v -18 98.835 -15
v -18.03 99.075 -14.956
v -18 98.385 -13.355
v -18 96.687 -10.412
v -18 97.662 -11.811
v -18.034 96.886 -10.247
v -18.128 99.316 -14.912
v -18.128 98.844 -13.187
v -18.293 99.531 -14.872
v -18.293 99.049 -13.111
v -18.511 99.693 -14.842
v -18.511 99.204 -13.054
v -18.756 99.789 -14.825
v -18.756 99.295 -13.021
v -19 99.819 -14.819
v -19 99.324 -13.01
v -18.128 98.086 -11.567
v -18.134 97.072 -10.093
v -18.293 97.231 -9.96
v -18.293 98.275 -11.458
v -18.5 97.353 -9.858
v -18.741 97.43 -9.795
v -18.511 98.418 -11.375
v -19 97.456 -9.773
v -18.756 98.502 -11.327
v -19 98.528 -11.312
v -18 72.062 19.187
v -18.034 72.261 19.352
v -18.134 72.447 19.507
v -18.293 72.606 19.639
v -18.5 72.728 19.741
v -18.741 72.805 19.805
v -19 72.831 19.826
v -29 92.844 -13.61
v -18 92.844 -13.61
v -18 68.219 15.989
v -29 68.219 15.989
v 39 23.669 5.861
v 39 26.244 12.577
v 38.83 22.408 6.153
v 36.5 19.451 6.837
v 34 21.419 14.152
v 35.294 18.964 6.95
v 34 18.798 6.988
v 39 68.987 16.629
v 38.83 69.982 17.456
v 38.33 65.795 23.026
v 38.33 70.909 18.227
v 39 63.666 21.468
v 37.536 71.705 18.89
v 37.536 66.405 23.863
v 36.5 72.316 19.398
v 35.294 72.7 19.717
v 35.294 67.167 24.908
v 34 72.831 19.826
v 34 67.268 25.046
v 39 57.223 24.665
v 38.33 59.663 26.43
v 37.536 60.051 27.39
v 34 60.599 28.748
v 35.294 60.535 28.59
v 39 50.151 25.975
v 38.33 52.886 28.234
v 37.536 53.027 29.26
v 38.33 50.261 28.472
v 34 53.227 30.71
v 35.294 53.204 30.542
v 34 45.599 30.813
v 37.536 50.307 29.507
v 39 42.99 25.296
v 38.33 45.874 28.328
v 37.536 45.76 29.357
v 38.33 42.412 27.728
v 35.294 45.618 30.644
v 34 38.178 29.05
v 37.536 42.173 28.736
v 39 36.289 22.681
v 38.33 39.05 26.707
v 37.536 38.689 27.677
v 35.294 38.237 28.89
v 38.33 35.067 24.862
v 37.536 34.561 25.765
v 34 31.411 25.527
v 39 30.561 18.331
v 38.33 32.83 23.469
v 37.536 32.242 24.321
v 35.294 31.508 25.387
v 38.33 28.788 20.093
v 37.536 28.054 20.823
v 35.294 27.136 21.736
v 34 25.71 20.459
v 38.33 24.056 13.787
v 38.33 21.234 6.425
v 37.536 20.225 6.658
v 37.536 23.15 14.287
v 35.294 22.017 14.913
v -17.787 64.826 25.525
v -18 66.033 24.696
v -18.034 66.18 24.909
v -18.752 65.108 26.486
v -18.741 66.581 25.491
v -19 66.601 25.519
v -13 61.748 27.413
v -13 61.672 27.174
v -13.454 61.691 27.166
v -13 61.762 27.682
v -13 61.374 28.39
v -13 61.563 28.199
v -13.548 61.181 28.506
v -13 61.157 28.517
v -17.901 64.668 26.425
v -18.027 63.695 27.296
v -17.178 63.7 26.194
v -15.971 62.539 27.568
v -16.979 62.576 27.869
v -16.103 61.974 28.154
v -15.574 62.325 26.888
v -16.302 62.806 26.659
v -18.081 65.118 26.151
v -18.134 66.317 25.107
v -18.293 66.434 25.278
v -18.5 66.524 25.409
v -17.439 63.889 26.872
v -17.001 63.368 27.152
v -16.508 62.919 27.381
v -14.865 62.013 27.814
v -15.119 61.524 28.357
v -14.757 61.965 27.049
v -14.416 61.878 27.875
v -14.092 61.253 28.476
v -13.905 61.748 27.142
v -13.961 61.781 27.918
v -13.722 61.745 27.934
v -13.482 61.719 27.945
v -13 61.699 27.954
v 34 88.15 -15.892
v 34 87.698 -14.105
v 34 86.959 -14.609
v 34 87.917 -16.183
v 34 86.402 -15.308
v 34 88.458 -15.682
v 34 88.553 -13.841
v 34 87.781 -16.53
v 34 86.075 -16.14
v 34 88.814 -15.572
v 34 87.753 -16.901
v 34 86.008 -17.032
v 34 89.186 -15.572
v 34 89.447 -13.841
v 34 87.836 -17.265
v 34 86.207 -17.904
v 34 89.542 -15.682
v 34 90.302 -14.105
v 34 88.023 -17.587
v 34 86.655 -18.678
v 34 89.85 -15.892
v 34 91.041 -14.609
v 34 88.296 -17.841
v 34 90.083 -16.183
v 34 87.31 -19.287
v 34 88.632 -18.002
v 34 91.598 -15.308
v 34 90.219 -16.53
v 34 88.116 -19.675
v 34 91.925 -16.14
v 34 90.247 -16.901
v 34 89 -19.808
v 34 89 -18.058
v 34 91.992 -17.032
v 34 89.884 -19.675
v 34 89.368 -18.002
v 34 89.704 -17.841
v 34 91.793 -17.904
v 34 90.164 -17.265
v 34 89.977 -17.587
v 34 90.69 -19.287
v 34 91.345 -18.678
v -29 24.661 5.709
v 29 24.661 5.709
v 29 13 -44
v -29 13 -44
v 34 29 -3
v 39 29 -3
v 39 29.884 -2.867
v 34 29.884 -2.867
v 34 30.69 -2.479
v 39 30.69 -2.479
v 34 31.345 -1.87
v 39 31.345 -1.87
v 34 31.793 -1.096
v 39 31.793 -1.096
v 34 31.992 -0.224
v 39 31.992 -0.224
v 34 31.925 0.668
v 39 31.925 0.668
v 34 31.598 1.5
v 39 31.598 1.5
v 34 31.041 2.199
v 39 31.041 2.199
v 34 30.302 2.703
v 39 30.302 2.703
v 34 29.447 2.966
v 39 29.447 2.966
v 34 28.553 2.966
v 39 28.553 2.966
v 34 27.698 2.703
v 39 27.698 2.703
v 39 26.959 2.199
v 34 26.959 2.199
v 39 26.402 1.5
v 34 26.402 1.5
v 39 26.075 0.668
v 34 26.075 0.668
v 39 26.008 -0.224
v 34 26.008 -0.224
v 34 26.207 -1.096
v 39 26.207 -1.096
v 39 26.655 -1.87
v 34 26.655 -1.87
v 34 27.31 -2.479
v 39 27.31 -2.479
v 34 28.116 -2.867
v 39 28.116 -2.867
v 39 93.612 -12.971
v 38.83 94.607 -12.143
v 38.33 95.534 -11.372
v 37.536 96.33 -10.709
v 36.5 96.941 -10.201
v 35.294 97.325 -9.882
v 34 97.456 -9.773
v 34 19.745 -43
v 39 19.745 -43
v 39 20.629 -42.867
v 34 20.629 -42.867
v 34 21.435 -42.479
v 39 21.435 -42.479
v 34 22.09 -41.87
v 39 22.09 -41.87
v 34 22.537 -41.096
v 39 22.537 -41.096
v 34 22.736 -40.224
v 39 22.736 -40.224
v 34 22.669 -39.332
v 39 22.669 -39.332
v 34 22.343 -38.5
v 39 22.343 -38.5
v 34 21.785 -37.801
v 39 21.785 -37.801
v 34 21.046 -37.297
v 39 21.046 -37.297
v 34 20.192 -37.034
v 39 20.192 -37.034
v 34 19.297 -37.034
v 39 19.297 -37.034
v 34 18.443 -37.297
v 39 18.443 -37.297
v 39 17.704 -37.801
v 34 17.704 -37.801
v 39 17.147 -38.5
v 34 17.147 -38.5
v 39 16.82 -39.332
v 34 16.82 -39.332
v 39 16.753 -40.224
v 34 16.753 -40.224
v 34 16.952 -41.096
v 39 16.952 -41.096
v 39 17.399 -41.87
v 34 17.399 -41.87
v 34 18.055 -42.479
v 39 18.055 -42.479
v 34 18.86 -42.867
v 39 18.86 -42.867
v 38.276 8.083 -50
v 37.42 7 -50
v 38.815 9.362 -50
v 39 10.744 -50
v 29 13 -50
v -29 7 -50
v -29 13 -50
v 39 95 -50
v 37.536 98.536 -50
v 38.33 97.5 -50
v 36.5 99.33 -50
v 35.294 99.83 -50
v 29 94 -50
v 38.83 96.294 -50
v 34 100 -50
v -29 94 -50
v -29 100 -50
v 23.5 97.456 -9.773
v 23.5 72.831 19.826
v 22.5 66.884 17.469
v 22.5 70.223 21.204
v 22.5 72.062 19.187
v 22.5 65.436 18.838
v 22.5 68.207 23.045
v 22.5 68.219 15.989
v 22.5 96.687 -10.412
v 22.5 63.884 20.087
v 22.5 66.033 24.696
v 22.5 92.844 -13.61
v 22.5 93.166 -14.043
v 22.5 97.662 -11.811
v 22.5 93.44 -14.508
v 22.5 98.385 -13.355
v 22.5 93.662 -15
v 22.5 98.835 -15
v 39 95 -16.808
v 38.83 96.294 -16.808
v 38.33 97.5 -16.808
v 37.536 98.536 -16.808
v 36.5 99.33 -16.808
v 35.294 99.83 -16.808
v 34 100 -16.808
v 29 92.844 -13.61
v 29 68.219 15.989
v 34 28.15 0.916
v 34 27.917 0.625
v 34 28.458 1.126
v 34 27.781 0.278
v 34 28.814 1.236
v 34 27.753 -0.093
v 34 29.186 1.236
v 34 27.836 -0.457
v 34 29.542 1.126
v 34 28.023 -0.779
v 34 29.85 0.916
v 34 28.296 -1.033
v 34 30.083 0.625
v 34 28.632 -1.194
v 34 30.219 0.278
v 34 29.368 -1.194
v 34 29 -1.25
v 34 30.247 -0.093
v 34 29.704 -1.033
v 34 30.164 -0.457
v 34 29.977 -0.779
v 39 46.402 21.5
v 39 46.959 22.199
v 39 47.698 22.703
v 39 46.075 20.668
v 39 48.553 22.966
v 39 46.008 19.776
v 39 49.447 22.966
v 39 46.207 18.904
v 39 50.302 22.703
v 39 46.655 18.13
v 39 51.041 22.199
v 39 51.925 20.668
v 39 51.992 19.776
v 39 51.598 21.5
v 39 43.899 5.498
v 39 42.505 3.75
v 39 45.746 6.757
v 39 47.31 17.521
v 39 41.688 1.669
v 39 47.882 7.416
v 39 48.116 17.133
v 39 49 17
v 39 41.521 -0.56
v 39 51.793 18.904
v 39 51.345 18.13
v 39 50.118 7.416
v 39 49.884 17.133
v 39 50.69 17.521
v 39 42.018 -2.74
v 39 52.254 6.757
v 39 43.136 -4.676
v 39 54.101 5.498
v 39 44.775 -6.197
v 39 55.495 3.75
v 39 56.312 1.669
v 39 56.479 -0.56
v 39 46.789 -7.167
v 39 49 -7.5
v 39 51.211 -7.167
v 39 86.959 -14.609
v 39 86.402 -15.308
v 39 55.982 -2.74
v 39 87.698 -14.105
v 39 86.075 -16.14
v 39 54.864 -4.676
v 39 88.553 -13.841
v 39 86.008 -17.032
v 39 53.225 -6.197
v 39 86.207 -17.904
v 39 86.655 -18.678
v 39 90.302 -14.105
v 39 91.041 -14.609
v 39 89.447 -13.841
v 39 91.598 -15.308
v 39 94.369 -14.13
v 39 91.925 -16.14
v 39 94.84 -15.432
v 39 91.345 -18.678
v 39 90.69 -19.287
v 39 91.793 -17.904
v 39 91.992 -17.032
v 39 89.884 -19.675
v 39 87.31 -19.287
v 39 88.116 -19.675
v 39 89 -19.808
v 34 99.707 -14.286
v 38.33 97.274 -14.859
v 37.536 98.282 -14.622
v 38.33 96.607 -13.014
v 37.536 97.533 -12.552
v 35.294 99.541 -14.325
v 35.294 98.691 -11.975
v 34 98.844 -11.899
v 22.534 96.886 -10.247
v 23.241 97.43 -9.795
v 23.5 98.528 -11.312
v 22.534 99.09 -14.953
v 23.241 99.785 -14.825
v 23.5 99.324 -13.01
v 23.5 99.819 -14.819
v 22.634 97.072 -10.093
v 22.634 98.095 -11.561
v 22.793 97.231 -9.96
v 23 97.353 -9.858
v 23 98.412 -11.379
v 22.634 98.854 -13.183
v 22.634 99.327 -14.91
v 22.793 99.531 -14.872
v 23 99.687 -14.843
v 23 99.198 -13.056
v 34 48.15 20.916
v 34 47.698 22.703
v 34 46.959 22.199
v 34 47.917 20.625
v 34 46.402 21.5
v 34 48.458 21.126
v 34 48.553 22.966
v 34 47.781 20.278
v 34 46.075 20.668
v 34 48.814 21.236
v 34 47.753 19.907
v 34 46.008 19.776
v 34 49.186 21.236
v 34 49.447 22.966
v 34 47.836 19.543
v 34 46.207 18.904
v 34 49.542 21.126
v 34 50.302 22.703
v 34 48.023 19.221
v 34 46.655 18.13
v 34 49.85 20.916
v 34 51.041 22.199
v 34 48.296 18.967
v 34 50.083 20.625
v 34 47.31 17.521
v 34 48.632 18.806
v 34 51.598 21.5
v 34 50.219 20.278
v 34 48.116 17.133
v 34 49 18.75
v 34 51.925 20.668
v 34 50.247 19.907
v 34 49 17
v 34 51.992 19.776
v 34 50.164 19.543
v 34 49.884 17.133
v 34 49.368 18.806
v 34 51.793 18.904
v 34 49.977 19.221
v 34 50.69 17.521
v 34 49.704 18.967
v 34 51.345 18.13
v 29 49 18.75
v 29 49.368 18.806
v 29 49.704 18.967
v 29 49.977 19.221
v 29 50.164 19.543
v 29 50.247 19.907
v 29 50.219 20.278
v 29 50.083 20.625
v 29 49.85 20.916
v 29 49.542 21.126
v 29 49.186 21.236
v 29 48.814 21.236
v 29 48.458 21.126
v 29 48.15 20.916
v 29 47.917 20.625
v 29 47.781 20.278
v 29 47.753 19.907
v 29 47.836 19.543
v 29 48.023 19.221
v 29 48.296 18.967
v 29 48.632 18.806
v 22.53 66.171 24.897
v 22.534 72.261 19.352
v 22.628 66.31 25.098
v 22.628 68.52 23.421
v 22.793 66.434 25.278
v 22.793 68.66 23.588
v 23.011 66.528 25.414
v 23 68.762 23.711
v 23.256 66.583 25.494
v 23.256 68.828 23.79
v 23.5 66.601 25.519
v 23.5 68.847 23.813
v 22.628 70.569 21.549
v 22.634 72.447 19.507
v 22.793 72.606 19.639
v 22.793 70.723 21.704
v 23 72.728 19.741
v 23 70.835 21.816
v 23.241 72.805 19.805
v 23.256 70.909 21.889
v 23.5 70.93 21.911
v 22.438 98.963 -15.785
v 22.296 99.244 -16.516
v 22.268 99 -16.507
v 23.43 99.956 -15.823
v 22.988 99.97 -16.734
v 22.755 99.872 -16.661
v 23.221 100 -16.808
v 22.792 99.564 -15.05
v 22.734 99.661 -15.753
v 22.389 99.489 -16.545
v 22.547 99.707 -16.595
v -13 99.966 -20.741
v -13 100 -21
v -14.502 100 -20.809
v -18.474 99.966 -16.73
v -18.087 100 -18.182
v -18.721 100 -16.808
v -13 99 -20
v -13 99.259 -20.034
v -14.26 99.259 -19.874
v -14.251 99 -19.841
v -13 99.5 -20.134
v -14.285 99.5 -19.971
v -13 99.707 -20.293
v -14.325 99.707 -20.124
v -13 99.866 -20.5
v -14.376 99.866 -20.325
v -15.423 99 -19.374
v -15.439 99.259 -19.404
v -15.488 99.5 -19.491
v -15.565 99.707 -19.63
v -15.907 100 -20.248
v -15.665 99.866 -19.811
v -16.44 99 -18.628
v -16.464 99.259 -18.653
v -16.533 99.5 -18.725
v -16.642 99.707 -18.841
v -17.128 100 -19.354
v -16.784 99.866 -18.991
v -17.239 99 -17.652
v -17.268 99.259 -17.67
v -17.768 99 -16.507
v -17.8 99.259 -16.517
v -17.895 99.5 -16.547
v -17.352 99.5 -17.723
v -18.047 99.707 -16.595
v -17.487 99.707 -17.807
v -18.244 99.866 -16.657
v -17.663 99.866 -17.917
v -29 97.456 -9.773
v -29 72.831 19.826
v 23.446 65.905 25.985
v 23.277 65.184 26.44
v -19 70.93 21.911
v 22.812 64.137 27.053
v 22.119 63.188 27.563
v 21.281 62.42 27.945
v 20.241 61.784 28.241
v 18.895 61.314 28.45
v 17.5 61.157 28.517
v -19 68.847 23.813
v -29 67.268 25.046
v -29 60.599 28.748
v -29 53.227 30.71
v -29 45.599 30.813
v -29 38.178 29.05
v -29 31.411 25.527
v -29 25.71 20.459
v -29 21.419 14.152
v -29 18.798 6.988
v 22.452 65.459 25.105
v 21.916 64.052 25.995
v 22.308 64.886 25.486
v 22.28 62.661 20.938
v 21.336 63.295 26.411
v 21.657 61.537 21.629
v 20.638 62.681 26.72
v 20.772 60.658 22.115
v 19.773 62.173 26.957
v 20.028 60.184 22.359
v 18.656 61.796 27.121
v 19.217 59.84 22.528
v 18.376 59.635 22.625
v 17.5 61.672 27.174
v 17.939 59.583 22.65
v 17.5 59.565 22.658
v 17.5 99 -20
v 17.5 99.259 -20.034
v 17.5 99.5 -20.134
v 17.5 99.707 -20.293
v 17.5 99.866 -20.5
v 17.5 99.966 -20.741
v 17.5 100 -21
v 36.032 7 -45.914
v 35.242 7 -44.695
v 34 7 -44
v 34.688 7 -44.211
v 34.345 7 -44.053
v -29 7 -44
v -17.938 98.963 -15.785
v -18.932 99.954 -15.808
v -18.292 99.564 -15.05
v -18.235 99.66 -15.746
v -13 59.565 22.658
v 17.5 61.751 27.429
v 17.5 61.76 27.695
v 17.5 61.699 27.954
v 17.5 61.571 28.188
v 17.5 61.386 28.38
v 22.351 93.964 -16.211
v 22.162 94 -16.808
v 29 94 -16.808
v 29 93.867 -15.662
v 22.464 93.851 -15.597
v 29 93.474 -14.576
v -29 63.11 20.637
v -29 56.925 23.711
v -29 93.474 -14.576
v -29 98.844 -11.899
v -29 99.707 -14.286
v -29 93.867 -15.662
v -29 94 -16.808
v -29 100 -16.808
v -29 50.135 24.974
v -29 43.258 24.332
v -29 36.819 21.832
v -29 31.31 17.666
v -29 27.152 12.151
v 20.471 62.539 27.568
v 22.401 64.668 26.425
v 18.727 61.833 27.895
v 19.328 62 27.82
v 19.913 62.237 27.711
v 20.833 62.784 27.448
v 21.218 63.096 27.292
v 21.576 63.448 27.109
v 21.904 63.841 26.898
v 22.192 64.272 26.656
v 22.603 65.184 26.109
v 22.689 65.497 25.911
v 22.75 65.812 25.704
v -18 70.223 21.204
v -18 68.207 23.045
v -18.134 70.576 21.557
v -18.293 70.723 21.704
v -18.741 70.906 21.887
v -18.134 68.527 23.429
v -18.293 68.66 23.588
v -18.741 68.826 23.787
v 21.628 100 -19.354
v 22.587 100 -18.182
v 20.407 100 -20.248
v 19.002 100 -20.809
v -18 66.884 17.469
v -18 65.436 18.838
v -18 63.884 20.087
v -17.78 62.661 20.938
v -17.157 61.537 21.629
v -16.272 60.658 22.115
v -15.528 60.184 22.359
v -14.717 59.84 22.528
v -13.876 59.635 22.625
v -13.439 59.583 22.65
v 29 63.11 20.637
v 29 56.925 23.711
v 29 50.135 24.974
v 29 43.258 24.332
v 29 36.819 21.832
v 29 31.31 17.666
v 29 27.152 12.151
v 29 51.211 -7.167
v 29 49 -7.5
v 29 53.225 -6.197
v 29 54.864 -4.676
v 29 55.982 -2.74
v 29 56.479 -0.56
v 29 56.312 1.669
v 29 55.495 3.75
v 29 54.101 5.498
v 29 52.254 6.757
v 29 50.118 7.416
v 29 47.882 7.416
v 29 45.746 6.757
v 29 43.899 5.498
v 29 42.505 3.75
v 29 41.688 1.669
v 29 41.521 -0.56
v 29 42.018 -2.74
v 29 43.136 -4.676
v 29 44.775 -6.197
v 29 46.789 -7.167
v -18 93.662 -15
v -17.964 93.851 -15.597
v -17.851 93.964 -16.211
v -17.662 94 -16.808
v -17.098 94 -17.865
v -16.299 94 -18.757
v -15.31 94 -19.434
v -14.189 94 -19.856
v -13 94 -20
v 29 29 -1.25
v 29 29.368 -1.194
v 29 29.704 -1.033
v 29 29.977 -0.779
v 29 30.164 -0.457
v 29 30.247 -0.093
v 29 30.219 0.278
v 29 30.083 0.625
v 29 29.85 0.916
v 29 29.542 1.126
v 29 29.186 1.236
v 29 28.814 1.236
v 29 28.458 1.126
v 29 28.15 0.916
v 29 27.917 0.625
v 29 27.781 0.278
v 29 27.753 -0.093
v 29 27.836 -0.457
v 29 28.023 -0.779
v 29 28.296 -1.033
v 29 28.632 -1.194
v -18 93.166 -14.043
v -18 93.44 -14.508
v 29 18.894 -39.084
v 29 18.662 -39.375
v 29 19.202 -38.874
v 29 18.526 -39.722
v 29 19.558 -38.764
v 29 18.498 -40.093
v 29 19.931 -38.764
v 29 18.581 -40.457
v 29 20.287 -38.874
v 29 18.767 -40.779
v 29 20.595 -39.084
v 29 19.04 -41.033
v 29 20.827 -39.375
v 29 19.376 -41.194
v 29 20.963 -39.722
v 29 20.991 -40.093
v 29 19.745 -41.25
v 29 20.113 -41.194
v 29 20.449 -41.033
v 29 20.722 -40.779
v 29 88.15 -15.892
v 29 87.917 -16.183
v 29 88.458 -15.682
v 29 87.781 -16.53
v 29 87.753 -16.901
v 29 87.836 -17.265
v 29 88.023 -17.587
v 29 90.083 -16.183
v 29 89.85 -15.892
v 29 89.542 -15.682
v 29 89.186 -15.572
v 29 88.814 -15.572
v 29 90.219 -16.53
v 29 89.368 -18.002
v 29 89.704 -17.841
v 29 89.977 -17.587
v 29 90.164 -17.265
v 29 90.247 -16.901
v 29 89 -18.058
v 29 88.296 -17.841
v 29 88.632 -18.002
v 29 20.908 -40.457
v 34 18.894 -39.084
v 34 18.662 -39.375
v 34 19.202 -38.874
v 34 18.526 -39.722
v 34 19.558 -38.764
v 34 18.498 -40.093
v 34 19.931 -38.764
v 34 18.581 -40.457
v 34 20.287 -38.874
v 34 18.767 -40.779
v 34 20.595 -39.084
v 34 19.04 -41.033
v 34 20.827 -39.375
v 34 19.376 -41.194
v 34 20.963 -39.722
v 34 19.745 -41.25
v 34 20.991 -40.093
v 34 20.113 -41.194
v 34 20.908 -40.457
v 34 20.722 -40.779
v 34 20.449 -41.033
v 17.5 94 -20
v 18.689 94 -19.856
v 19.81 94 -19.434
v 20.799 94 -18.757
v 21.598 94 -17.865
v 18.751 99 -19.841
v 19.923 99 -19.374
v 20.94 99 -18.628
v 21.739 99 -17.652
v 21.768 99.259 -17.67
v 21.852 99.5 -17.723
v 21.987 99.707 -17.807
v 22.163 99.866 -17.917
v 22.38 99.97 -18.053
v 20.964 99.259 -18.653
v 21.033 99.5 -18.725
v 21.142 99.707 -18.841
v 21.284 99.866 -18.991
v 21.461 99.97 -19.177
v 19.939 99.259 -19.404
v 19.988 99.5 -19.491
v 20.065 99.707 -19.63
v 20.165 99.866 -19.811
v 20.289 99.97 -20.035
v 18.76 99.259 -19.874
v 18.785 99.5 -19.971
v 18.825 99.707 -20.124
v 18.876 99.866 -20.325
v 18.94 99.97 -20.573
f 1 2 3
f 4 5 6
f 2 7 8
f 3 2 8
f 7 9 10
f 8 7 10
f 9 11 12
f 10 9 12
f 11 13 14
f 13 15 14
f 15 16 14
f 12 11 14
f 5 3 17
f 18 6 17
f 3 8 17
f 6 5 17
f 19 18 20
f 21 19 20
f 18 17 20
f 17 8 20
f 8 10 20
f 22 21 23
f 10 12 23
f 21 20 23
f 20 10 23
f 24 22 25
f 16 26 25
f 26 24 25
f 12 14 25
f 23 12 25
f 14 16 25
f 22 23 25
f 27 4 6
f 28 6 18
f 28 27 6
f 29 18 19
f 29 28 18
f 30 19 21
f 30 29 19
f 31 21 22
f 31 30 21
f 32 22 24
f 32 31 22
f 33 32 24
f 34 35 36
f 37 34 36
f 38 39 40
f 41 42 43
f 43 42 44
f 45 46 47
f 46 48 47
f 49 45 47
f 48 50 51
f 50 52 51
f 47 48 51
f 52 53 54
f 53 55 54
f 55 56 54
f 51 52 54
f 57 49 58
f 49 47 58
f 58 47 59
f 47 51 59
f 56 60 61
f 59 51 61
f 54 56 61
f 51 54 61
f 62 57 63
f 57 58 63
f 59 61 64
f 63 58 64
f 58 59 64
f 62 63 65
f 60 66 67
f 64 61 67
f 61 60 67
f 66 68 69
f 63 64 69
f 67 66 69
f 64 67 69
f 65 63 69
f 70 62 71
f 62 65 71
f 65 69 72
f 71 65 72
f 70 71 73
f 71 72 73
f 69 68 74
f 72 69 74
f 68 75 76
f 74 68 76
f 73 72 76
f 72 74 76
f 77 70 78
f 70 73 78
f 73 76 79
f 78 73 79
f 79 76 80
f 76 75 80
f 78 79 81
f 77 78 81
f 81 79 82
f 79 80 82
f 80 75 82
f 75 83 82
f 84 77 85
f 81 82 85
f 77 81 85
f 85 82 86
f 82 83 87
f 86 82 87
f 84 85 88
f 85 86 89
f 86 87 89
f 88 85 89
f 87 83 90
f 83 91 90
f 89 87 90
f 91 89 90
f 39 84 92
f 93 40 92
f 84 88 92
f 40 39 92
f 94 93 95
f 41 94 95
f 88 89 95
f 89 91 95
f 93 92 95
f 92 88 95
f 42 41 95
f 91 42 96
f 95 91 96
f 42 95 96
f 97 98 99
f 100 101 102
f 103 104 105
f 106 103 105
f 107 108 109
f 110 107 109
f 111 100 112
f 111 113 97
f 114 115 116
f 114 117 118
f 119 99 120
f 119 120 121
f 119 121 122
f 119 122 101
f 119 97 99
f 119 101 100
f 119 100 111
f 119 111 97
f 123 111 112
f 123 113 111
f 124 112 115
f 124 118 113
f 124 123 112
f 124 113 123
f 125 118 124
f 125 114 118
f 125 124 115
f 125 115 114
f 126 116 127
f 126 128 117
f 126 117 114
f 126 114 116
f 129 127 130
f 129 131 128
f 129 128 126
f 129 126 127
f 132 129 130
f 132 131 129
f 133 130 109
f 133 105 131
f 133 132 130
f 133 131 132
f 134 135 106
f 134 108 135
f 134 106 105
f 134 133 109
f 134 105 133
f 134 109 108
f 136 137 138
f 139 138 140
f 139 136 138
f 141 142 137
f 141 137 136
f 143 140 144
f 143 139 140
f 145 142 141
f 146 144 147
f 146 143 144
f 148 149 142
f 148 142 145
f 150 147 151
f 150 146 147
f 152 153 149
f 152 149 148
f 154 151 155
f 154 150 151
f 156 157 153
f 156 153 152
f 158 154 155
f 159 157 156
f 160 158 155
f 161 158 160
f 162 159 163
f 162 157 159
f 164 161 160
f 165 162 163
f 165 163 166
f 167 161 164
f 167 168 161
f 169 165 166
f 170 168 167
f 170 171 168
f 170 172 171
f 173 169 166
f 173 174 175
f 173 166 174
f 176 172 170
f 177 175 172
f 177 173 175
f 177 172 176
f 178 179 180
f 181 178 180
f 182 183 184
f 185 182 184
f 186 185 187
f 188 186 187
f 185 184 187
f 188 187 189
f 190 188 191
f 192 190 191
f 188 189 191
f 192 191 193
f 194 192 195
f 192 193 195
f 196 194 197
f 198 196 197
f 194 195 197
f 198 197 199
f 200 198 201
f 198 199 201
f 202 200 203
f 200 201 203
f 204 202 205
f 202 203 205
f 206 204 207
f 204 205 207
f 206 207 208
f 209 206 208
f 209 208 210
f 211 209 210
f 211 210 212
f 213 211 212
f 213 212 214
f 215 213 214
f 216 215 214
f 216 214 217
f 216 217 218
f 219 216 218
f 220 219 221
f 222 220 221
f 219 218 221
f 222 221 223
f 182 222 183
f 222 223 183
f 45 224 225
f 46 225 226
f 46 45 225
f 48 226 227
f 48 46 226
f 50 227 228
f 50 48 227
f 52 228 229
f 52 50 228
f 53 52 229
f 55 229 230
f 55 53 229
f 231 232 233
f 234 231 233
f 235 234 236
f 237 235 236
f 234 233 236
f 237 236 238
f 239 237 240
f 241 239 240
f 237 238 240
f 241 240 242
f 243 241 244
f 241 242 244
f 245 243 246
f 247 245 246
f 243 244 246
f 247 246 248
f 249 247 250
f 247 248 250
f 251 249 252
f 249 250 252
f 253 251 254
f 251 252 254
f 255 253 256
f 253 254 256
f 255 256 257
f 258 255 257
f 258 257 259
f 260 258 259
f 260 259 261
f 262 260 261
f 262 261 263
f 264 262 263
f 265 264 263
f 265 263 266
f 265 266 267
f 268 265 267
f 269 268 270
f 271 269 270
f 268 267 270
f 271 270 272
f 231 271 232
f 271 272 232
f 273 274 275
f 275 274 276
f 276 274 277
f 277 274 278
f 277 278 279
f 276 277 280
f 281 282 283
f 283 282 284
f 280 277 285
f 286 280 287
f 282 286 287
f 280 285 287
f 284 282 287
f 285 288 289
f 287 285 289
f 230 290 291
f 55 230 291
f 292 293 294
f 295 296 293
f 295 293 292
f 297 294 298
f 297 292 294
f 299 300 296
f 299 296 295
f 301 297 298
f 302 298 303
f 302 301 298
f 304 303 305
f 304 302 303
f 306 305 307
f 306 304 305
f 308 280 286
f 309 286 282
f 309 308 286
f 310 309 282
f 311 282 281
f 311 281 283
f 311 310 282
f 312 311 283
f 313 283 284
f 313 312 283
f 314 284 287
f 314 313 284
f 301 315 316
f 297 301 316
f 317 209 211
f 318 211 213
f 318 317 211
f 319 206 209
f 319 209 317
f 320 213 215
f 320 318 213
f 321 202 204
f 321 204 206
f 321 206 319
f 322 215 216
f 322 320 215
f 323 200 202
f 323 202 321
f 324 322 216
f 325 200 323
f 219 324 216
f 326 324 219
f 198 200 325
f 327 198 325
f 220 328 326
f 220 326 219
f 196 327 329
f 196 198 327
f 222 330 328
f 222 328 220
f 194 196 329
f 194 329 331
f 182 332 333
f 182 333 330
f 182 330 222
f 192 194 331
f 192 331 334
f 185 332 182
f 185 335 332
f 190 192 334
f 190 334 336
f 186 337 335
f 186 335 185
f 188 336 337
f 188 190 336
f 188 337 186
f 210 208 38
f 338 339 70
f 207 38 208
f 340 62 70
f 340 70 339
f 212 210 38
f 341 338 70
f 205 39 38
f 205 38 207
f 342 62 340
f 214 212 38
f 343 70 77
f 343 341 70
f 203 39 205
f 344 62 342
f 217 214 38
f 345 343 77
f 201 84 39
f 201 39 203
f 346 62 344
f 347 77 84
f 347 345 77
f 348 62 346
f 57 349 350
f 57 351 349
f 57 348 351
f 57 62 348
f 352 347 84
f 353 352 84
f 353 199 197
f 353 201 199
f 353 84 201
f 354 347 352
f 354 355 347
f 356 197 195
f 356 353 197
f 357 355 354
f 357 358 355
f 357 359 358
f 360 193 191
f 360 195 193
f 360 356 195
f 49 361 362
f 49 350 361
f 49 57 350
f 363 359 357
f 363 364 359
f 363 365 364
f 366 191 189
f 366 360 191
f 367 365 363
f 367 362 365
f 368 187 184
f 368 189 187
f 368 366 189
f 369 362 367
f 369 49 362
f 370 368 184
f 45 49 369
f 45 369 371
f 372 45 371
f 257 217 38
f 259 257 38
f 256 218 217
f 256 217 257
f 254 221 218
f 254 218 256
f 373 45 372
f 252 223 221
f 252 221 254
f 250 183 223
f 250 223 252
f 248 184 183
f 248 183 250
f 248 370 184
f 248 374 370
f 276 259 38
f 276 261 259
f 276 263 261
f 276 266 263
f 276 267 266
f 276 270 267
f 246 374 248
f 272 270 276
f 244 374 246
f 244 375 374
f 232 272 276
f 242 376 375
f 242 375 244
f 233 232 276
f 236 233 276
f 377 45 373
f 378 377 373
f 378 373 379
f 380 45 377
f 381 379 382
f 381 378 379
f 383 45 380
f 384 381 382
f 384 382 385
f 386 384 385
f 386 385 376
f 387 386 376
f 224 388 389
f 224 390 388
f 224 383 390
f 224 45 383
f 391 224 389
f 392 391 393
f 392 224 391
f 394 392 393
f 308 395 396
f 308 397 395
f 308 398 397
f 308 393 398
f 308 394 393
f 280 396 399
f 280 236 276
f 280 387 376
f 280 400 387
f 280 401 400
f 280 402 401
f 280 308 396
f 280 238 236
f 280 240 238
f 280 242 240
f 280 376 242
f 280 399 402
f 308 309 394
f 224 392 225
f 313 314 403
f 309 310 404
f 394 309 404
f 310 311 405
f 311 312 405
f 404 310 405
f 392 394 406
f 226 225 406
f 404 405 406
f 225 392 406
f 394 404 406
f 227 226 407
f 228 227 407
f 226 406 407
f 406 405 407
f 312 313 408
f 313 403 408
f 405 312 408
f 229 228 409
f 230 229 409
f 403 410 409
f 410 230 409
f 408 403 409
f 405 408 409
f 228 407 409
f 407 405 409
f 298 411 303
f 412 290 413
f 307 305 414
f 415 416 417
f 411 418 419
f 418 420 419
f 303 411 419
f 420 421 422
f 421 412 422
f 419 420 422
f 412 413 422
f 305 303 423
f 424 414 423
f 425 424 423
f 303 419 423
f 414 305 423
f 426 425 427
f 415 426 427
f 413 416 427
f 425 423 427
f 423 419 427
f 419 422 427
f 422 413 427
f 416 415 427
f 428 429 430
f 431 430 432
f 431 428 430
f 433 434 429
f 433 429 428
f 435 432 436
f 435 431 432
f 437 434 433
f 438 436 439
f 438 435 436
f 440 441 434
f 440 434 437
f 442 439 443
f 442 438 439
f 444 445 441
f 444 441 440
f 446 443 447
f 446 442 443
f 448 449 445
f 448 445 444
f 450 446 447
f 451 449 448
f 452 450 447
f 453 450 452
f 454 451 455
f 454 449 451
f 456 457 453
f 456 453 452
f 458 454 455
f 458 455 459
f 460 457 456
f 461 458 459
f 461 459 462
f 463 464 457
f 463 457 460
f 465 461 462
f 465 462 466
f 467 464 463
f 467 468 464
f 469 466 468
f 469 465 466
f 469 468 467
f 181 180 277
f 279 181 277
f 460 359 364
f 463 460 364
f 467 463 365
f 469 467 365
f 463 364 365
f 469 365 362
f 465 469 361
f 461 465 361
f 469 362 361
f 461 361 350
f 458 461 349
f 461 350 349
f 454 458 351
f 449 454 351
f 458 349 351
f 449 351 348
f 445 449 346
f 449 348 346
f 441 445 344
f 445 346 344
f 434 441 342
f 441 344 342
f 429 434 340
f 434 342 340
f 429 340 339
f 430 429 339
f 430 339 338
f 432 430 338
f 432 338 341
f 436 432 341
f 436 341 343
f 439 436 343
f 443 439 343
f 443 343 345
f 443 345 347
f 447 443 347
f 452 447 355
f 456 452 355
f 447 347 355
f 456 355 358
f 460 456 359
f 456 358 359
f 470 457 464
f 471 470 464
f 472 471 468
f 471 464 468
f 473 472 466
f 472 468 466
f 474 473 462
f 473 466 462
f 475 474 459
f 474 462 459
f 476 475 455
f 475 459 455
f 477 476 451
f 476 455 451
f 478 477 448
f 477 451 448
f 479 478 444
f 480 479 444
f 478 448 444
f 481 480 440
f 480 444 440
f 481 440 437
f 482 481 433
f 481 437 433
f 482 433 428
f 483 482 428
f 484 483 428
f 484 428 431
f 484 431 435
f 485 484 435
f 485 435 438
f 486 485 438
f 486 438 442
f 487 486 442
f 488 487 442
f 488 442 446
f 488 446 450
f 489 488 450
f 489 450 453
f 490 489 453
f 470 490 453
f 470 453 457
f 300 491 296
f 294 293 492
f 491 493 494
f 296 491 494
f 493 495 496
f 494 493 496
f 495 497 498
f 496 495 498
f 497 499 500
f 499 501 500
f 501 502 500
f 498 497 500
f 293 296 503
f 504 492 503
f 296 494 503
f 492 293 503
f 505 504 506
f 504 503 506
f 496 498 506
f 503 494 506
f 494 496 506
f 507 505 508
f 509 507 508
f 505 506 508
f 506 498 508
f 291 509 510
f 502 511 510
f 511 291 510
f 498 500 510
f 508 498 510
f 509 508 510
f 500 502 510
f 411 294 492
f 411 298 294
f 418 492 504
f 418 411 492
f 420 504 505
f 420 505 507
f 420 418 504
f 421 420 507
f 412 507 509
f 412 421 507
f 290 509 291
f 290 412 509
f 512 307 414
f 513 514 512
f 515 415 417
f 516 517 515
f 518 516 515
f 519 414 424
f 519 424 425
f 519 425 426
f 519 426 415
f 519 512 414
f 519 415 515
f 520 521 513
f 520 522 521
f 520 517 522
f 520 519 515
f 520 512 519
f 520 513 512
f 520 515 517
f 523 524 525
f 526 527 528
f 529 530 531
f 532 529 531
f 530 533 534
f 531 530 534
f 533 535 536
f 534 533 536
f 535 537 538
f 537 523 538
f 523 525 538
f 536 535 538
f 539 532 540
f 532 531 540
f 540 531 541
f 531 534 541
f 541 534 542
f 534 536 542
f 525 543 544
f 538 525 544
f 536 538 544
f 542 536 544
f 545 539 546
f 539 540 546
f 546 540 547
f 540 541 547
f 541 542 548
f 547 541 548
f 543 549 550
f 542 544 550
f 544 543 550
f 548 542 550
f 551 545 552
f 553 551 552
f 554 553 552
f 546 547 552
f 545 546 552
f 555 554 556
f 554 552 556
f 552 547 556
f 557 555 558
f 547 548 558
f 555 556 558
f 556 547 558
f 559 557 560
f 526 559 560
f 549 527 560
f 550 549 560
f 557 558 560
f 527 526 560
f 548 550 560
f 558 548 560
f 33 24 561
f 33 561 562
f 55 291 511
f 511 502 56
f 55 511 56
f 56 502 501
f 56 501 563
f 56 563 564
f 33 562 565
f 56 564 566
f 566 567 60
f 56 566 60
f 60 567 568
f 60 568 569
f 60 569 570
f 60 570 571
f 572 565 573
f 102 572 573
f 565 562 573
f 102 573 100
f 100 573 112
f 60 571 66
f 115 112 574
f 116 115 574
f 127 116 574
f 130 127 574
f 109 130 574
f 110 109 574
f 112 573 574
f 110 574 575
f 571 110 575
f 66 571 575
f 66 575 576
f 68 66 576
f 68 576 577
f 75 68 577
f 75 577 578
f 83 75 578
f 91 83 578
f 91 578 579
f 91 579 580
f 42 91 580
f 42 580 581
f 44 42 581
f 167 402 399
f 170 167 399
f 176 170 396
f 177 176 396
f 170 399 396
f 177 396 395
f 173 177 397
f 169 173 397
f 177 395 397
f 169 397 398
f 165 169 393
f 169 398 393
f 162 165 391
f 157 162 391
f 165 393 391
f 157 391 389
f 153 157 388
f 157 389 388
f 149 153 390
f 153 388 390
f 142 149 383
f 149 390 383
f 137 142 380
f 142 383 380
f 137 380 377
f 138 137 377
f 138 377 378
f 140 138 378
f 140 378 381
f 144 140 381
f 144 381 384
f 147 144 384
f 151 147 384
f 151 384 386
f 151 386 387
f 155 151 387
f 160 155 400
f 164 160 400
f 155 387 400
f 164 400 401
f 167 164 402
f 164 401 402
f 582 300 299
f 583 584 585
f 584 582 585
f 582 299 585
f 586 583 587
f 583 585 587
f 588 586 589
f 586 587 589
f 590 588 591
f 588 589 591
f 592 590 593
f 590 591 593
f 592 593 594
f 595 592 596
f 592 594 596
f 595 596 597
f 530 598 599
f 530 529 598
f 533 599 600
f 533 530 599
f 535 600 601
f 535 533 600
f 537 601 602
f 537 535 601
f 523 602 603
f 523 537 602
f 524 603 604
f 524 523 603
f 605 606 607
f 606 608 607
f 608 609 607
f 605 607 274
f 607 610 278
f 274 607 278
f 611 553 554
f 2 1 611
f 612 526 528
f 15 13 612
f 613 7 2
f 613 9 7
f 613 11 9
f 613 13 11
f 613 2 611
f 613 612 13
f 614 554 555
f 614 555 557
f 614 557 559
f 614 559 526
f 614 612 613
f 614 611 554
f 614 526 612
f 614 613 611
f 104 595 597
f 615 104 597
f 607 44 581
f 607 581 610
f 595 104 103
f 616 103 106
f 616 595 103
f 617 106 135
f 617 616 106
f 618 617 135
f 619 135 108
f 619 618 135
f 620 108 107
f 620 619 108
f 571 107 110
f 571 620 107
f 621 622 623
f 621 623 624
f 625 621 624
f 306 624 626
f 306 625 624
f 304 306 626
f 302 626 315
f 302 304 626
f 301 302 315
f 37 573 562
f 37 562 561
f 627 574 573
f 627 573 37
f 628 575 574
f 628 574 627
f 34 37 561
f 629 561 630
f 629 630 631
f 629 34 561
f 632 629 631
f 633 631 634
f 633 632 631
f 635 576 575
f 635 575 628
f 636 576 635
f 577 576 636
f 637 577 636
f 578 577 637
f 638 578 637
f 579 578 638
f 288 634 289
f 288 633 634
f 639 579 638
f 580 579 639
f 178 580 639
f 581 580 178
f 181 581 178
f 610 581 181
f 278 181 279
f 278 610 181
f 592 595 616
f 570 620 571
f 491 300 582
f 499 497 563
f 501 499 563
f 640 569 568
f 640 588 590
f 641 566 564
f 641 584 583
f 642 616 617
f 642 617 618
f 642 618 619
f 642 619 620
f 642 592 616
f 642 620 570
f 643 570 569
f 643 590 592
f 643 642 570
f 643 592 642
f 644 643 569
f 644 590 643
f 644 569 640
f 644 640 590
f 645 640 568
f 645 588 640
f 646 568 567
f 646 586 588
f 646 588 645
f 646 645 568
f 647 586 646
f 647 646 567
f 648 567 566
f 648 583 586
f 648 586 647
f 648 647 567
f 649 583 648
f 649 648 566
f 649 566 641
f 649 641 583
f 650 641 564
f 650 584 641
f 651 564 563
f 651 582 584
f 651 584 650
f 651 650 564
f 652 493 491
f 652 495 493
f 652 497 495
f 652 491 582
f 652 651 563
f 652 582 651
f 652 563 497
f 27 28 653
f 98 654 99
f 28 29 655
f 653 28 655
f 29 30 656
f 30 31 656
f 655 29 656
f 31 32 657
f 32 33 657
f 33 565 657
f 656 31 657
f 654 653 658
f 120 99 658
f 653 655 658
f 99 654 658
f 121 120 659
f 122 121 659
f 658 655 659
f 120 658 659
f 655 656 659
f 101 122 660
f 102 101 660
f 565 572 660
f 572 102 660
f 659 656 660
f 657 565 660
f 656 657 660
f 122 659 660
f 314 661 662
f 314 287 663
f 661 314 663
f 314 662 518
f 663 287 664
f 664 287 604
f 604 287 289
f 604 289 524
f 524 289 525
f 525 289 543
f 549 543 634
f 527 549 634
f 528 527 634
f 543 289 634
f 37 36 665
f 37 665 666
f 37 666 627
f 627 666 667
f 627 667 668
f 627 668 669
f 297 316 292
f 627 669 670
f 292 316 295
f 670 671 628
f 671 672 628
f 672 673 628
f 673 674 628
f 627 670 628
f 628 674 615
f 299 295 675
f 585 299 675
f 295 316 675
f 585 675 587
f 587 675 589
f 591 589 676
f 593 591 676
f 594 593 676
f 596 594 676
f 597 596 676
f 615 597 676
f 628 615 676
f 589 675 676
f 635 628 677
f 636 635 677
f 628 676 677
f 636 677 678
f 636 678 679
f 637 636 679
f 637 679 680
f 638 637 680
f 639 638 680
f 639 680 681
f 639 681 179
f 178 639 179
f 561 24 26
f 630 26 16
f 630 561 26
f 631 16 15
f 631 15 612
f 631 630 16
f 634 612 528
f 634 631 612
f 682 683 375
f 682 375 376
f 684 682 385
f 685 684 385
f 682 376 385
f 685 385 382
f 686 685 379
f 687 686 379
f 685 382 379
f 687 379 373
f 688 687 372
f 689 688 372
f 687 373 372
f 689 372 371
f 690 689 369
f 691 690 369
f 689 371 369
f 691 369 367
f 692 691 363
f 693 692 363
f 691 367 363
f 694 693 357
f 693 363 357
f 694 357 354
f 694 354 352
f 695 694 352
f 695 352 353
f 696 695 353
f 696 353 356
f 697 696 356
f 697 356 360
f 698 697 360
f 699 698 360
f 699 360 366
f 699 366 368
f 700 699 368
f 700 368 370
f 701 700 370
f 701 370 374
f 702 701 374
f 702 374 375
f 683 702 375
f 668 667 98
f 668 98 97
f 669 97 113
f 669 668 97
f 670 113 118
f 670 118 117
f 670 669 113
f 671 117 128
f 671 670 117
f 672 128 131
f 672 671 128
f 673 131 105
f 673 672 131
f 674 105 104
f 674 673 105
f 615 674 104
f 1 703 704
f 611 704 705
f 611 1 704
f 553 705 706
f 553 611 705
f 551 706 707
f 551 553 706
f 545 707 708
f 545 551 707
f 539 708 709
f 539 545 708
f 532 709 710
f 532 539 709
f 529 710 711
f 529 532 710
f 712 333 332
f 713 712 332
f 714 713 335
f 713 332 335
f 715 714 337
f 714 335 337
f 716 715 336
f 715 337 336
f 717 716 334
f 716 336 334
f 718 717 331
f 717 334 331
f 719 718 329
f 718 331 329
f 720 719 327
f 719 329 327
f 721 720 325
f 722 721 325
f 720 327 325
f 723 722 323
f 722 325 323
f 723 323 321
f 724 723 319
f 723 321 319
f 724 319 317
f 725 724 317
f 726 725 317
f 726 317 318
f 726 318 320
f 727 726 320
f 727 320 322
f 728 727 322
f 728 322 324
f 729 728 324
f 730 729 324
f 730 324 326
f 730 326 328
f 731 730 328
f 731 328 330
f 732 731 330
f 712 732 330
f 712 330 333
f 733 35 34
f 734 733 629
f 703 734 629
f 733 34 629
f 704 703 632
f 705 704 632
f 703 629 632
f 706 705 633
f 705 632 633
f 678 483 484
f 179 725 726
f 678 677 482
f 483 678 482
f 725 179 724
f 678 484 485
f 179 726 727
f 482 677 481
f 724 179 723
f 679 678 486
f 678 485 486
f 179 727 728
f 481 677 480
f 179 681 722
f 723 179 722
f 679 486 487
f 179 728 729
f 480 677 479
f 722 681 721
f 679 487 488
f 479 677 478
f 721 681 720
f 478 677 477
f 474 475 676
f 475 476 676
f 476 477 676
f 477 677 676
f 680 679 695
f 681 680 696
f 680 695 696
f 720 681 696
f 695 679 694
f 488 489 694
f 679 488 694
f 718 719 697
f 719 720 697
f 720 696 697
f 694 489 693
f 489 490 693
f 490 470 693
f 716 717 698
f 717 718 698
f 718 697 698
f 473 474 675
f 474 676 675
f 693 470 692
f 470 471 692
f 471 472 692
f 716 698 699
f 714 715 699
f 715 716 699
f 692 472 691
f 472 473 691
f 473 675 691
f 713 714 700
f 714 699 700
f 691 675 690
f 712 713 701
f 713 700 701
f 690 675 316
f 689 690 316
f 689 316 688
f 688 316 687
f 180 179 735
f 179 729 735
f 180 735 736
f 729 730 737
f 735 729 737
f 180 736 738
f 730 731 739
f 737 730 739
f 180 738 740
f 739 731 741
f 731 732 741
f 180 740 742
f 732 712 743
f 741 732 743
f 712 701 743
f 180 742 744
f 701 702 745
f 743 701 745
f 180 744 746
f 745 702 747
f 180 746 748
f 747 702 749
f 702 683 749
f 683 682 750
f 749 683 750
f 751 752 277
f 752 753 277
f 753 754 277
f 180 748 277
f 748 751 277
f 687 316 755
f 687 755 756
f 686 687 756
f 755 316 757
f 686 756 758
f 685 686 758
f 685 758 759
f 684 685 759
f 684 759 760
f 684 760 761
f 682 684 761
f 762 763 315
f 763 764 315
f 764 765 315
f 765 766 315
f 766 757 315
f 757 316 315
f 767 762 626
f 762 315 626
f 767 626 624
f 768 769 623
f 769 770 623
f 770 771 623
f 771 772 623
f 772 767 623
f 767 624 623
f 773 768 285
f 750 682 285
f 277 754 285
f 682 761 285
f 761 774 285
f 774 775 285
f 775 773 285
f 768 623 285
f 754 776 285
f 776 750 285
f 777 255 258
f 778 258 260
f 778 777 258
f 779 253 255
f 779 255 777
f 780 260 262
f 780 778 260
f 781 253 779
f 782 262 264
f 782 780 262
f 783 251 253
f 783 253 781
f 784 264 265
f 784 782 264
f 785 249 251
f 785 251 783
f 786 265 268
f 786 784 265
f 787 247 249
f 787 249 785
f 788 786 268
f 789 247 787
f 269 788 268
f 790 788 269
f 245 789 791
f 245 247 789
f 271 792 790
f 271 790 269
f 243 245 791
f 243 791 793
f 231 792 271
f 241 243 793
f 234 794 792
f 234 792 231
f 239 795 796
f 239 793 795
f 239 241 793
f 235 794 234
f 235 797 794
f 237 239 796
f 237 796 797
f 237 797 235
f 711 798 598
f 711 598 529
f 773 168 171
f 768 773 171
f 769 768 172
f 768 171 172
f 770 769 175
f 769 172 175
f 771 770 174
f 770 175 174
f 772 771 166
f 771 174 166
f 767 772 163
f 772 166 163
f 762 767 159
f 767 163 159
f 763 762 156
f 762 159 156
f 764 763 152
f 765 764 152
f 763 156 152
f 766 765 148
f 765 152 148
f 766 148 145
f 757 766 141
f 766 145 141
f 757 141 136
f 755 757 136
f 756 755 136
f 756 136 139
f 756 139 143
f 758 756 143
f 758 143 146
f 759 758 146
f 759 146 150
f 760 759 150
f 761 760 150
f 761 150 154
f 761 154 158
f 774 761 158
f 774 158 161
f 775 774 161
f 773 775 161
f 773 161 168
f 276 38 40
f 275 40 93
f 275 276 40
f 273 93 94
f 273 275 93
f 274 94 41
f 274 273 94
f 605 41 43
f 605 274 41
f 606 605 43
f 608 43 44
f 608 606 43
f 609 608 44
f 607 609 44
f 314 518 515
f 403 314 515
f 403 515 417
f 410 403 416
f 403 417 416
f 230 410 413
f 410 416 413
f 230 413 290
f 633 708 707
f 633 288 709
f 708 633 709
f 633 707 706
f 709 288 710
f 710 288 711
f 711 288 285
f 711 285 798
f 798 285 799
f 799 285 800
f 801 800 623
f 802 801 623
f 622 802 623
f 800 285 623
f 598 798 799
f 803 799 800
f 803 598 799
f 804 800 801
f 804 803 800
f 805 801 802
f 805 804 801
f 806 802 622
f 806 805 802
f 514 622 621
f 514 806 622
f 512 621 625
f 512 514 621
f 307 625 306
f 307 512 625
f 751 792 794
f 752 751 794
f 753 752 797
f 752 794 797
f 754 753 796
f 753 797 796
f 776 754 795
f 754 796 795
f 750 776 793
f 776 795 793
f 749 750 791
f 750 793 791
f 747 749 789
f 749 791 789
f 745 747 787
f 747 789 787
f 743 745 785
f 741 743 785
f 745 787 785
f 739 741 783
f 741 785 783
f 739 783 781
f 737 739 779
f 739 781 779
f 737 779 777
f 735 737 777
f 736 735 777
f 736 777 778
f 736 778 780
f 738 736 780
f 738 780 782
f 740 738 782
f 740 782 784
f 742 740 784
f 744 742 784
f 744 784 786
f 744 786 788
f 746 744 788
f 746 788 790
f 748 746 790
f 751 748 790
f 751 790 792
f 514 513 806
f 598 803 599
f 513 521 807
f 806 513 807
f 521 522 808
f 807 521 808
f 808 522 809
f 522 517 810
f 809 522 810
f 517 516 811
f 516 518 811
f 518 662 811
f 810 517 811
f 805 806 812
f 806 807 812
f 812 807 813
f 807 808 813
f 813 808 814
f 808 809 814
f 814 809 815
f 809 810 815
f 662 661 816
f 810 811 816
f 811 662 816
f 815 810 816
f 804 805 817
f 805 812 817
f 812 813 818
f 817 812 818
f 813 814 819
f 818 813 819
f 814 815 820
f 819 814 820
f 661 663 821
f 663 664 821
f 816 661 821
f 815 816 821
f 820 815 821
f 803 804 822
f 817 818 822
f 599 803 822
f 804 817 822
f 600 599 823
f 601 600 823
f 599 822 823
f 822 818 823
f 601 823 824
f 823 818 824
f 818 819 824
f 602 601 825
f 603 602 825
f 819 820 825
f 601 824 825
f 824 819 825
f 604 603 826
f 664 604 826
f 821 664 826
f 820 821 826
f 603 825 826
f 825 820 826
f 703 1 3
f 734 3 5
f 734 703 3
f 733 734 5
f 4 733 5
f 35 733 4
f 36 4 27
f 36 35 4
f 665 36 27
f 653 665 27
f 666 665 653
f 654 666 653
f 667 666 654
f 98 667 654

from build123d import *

# Parameters (mm, degrees)
BOSS_EXTRUDE1_DEPTH = 100
CUT_EXTRUDE1_DEPTH  = 126.95237195067031
FILLET1_R           = 5
BOSS_EXTRUDE2_START = 40.5
BOSS_EXTRUDE2_DEPTH = 40.5
FILLET2_R           = 11
FILLET3_R           = 5
BOSS_EXTRUDE4_DEPTH = 10
FILLET5_R           = 1
FILLET6_R           = 5
SKETCH8_R           = 7.5
CUT_EXTRUDE2_DEPTH  = 131.85870255202755
SKETCH9_R           = 1.2499999999993074
SKETCH9_R_2         = 1.2499999999993041
SKETCH9_R_3         = 1.2499999999993108
CUT_EXTRUDE3_DEPTH  = 131.85870255202755
SKETCH10_R          = 2.999999999999271
SKETCH10_R_2        = 2.9999999999993827
SKETCH10_R_3        = 2.9999999999993676
SKETCH10_R_4        = 2.9999999999984848
CUT_EXTRUDE4_DEPTH  = 5


with BuildPart() as part:
    # Sketch1 → Boss-Extrude1 (new body)
    with BuildSketch(Plane(origin=(0, 0, 0), x_dir=(1, 0, 0), z_dir=(0, 1, 0))):
        Polygon((-29.000000000000004, -50), (-29.000000000000004, 50), (28.999999999999996, 50.00000000000001), (28.999999999999996, -50), (22.5, -50), (22.49999999999999, 20.000000000000004), (-18.000000000000007, 20.000000000000004), (-18.000000000000007, -50), align=None)
    extrude(amount=BOSS_EXTRUDE1_DEPTH)

    # Sketch5 → Cut-Extrude1 (cut, through all)
    with BuildSketch(Plane(origin=(28.999999999999996, 0, 0), x_dir=(0, 0, -1), z_dir=(1, 0, 0))):
        with BuildLine():
            Line((50.00000000000001, 94), (15.000000000000007, 94))
            Line((15.000000000000007, 94), (-15.988977704079698, 68.21854812358211))
            ThreePointArc((-15.988977704079698, 68.21854812358211), (-24.331609312743236, 43.25780632057522), (-5.709440185764556, 24.660684217398867))
            Line((-5.709440185764556, 24.660684217398867), (44.000000000000014, 12.999999999999998))
            Line((44.000000000000014, 12.999999999999998), (50.00000000000001, 12.999999999999998))
            Line((50.00000000000001, 12.999999999999998), (50.00000000000001, 94))
        make_face()
        with BuildLine():
            Line((12.83046096501491, 100), (-19.82633235305885, 72.8309996732418))
            ThreePointArc((-19.82633235305885, 72.8309996732418), (-30.160384185664846, 41.83402304126666), (-6.988314668956372, 18.797956061093338))
            Line((-6.988314668956372, 18.797956061093338), (44, 6.999999999999997))
            Line((44, 6.999999999999997), (49.99999999999999, 6.999999999999992))
            Line((49.99999999999999, 6.999999999999992), (49.99999999999999, 0))
            Line((49.99999999999999, 0), (-50.00000000000001, 0))
            Line((-50.00000000000001, 0), (-50.00000000000001, 100))
            Line((-50.00000000000001, 100), (12.83046096501491, 100))
        make_face()
    extrude(amount=-CUT_EXTRUDE1_DEPTH, mode=Mode.SUBTRACT)

    # Fillet1
    fillet1_edges = [part.edges().sort_by_distance(p)[0] for p in [
        (-23.500000000000004, 94, -15.000000000000007),
        (25.749999999999993, 94, -15.000000000000007),
    ]]
    fillet(fillet1_edges, radius=FILLET1_R)

    # Sketch6 → Boss-Extrude2 (add)
    with BuildSketch(Plane(origin=(-18.000000000000007, 0, 0), x_dir=(1e-16, 0, -1), z_dir=(1, 0, 1e-16)).offset(BOSS_EXTRUDE2_START)):
        with BuildLine():
            Line((19.999999999999996, 12.553251706878484), (-6.988314668956373, 18.79795606109335))
            ThreePointArc((-6.988314668956373, 18.79795606109335), (-27.865951255157718, 35.417336025463435), (-28.095541398136127, 62.1011661139617))
            Line((-28.095541398136127, 62.1011661139617), (-22.657694675916233, 59.56545654351749))
            ThreePointArc((-22.657694675916233, 59.56545654351749), (-22.489094420401646, 38.08026409887772), (-5.709440185764564, 24.66068421739888))
            Line((-5.709440185764564, 24.66068421739888), (19.999999999999993, 18.62984455611945))
            Line((19.999999999999993, 18.62984455611945), (19.999999999999996, 12.553251706878484))
        make_face()
    extrude(amount=-BOSS_EXTRUDE2_DEPTH)

    # Fillet2
    fillet2_edges = [part.edges().sort_by_distance(p)[0] for p in [
        (25.749999999999993, 100, -12.83046096501491),
        (-23.500000000000004, 100, -12.83046096501491),
    ]]
    fillet(fillet2_edges, radius=FILLET2_R)

    # Fillet3
    fillet3_edges = [part.edges().sort_by_distance(p)[0] for p in [
        (22.49999999999999, 60.8333113287396, 25.376618037026184),
        (-18.00000000000001, 60.8333113287396, 25.37661803702618),
        (22.49999999999999, 97, -20.000000000000004),
        (-18.000000000000007, 97, -20.000000000000004),
    ]]
    fillet(fillet3_edges, radius=FILLET3_R)

    # Sketch7 → Boss-Extrude4 (add)
    with BuildSketch(Plane(origin=(28.999999999999996, 0, 0), x_dir=(0, 0, -1), z_dir=(1, 0, 0))):
        with BuildLine():
            Line((50.00000000000001, 100), (16.807949195820918, 100))
            ThreePointArc((16.807949195820918, 100), (13.067479500591284, 99.34450996708247), (9.772799006025844, 97.45616117437613))
            Line((9.772799006025844, 97.45616117437613), (-19.82633235305885, 72.8309996732418))
            ThreePointArc((-19.82633235305885, 72.8309996732418), (-30.160384185664846, 41.83402304126666), (-6.9883146689563755, 18.797956061093355))
            Line((-6.9883146689563755, 18.797956061093355), (44, 6.999999999999997))
            Line((44, 6.999999999999997), (49.99999999999999, 6.999999999999992))
            Line((49.99999999999999, 6.999999999999992), (50.00000000000001, 100))
        make_face()
    extrude(amount=BOSS_EXTRUDE4_DEPTH)

    # Fillet5
    fillet5_edges = [part.edges().sort_by_distance(p)[0] for p in [
        (22.49999999999999, 99.00083975111619, -12.227206431541916),
        (-18.000000000000007, 85.14358042380897, 5.026766673516516),
        (22.499999999999993, 69.84794587448418, 22.942605623916762),
        (2.2499999999999893, 62.10116611396171, 28.095541398136127),
        (-18.000000000000007, 99.00083975111619, -12.227206431541916),
        (2.2499999999999893, 100, -20.000000000000004),
        (21.042619780265184, 63.42008867833863, 27.44195770208064),
        (-16.542619780265202, 63.42008867833864, 27.441957702080636),
        (20.324911858881205, 100, -19.12551487569155),
        (22.415270684599754, 99.96382489332538, -15.916577372895661),
        (-17.91527069193968, 99.96382489235059, -15.916577374222168),
        (-15.824911858881226, 100, -19.125514875691554),
        (-18.000000000000004, 69.84794587448418, 22.942605623916755),
        (22.49999999999999, 85.14358042380897, 5.026766673516505),
    ]]
    fillet(fillet5_edges, radius=FILLET5_R)

    # Fillet6
    fillet6_edges = [part.edges().sort_by_distance(p)[0] for p in [
        (39, 12.898978030546676, -18.50584266552181),
        (39, 41.834023041266654, 30.16038418566485),
        (39, 85.14358042380897, 5.026766673516503),
        (39, 99.34450996708247, -13.067479500591286),
        (39, 100, -33.40397459791046),
    ]]
    fillet(fillet6_edges, radius=FILLET6_R)

    # Sketch8 → Cut-Extrude2 (cut, through all)
    with BuildSketch(Plane(origin=(39, 0, 0), x_dir=(0, 0, -1), z_dir=(1, 0, 0))):
        with Locations((-6.94e-15, 49)):
            Circle(SKETCH8_R)
    extrude(amount=-CUT_EXTRUDE2_DEPTH, mode=Mode.SUBTRACT)

    # Sketch9 → Cut-Extrude3 (cut, through all)
    with BuildSketch(Plane(origin=(39, 0, 0), x_dir=(0, 0, -1), z_dir=(1, 0, 0))):
        with Locations((40.00000000000071, 19.744580488536943)):
            Circle(SKETCH9_R)
        with Locations((6.9389e-13, 29.000000000001137)):
            Circle(SKETCH9_R_2)
        with Locations((-19.999999999998934, 49.000000000000405)):
            Circle(SKETCH9_R_2)
        with Locations((16.807949195821617, 89.00000000000007)):
            Circle(SKETCH9_R_3)
    extrude(amount=-CUT_EXTRUDE3_DEPTH, mode=Mode.SUBTRACT)

    # Sketch10 → Cut-Extrude4 (cut)
    with BuildSketch(Plane(origin=(39, 0, 0), x_dir=(0, 0, -1), z_dir=(1, 0, 0))):
        with Locations((16.807949195821624, 89.00000000000007)):
            Circle(SKETCH10_R)
        with Locations((-19.999999999998906, 49.000000000000405)):
            Circle(SKETCH10_R_2)
        with Locations((-1.388e-14, 29.000000000001066)):
            Circle(SKETCH10_R_3)
        with Locations((40.000000000000725, 19.744580488536943)):
            Circle(SKETCH10_R_4)
    extrude(amount=-CUT_EXTRUDE4_DEPTH, mode=Mode.SUBTRACT)


solid = part.part
